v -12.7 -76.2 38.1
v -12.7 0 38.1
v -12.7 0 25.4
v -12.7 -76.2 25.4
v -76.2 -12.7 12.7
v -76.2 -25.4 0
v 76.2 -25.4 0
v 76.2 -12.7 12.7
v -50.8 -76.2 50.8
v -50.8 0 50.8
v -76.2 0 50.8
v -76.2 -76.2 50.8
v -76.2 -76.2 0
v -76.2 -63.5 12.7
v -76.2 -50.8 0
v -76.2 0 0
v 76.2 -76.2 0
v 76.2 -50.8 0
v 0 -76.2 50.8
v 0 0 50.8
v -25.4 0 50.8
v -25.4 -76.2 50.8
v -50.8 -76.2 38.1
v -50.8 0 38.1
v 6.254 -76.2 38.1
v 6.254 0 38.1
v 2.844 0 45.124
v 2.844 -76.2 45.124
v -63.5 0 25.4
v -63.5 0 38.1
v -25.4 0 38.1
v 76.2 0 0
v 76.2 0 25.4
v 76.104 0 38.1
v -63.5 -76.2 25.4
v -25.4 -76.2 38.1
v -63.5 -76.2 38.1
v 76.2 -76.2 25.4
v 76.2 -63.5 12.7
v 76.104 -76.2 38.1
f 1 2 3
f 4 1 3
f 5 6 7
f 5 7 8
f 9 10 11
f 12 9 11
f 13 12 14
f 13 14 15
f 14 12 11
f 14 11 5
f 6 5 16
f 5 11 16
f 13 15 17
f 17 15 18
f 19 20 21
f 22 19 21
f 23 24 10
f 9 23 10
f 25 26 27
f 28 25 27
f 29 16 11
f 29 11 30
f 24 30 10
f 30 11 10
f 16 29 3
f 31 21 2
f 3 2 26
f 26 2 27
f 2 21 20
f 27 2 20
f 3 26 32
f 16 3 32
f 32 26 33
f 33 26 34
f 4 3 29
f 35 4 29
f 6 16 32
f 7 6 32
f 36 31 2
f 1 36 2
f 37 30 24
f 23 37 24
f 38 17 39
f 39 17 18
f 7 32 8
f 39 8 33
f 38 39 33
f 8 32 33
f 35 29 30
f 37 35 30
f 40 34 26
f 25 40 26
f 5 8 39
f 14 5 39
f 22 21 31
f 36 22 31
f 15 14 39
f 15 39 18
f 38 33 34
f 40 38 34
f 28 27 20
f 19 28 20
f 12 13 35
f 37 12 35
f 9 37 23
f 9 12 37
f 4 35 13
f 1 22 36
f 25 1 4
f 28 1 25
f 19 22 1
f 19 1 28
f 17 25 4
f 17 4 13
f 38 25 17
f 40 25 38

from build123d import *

# Parameters (mm, degrees)
F1_DEPTH = 76.2
F3_DEPTH = 152.4


# Not quite as in the source:
# - a feature names something its author has since deleted; it is built from what else it names


with BuildPart() as f1:
    # F0 (on Front) → F1 (new body)
    with BuildSketch(Plane.XZ):
        Polygon((-76.2, 25.4), (-76.2, 0), (76.2, 0), (76.2, 25.4), (76.1036425829, 38.1), (6.2536425829, 38.1), (2.8439569287, 45.1241247356), (0, 50.8), (-25.4, 50.8), (-25.4, 38.1), (-12.7, 38.1), (-12.7, 25.4), (-63.5, 25.4), (-63.5, 38.1), (-50.8, 38.1), (-50.8, 50.8), (-76.2, 50.8), align=None)
    extrude(amount=F1_DEPTH)

    # F2 (on face) → F3 (cut)
    with BuildSketch(Plane.YZ.offset(76.2)):
        Polygon((-63.5, 12.7), (-50.8, 0), (-38.1, 0), (-38.1, 12.7), align=None)
        Polygon((-38.1, 12.7), (-38.1, 0), (-25.4, 0), (-12.7, 12.7), align=None)
    extrude(amount=-F3_DEPTH, mode=Mode.SUBTRACT)


solid = f1.part
